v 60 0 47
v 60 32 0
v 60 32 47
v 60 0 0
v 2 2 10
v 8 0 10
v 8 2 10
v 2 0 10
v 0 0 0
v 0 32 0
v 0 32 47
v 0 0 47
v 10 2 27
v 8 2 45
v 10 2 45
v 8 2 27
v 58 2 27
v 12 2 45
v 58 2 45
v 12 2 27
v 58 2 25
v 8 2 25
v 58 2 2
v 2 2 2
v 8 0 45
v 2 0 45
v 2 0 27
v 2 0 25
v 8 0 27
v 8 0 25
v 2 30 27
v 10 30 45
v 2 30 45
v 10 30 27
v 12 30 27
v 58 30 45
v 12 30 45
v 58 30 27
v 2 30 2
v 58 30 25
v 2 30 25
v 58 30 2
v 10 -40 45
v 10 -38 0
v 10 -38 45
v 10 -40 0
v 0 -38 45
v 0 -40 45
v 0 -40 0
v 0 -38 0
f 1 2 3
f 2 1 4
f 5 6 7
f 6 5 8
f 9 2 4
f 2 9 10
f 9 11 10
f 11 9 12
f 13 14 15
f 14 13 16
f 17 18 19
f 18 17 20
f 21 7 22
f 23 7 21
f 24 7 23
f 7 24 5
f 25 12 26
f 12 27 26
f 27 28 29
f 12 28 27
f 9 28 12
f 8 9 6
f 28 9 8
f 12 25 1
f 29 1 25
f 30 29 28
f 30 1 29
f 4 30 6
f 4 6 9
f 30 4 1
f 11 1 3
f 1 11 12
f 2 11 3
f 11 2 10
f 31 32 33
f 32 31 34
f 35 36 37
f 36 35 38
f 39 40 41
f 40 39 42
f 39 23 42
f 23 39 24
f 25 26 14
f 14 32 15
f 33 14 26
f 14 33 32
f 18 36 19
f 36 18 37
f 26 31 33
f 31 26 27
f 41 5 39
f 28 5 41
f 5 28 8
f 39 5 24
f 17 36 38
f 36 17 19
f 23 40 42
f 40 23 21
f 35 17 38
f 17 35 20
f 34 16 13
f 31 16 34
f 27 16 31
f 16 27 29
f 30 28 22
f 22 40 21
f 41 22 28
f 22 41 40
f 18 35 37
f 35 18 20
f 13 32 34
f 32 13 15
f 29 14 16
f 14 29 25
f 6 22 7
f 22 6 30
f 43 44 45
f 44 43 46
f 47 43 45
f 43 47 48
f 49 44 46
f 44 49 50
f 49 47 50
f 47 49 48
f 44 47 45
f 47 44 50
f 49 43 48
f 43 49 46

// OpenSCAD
cube ([60,2,10]); 
//parte atras
translate([0,30,0])
cube ([60 ,2,47]); //60*43
//partre de arriba
cube ([60,30,2]);//(60*30)*2
translate([0,0,45])
    //la parte arriba
    cube ([60,30,2]);
    //pared izquierda
    cube ([2,30,45]);//(45*30)*2
 translate([58,0,0])
 //parte de del lado derecha
    cube ([2,30,45]);
    //parte ede la mitad
    translate([0,0,25])
    cube ([20,30,2]);
    //malla para retenar el calor un grado
        color("gray")
        translate([20,0,25])
    cube ([38,30,2]);
 translate([10,0,27])    
    cube ([2,30,18]);//(20*30)*1
    //parte aclilica
    color("black",0.7)
    translate([8,0,10])
    cube ([50,2,35]); 
        translate([0,-40,0])
 cube([10,2,45]);
